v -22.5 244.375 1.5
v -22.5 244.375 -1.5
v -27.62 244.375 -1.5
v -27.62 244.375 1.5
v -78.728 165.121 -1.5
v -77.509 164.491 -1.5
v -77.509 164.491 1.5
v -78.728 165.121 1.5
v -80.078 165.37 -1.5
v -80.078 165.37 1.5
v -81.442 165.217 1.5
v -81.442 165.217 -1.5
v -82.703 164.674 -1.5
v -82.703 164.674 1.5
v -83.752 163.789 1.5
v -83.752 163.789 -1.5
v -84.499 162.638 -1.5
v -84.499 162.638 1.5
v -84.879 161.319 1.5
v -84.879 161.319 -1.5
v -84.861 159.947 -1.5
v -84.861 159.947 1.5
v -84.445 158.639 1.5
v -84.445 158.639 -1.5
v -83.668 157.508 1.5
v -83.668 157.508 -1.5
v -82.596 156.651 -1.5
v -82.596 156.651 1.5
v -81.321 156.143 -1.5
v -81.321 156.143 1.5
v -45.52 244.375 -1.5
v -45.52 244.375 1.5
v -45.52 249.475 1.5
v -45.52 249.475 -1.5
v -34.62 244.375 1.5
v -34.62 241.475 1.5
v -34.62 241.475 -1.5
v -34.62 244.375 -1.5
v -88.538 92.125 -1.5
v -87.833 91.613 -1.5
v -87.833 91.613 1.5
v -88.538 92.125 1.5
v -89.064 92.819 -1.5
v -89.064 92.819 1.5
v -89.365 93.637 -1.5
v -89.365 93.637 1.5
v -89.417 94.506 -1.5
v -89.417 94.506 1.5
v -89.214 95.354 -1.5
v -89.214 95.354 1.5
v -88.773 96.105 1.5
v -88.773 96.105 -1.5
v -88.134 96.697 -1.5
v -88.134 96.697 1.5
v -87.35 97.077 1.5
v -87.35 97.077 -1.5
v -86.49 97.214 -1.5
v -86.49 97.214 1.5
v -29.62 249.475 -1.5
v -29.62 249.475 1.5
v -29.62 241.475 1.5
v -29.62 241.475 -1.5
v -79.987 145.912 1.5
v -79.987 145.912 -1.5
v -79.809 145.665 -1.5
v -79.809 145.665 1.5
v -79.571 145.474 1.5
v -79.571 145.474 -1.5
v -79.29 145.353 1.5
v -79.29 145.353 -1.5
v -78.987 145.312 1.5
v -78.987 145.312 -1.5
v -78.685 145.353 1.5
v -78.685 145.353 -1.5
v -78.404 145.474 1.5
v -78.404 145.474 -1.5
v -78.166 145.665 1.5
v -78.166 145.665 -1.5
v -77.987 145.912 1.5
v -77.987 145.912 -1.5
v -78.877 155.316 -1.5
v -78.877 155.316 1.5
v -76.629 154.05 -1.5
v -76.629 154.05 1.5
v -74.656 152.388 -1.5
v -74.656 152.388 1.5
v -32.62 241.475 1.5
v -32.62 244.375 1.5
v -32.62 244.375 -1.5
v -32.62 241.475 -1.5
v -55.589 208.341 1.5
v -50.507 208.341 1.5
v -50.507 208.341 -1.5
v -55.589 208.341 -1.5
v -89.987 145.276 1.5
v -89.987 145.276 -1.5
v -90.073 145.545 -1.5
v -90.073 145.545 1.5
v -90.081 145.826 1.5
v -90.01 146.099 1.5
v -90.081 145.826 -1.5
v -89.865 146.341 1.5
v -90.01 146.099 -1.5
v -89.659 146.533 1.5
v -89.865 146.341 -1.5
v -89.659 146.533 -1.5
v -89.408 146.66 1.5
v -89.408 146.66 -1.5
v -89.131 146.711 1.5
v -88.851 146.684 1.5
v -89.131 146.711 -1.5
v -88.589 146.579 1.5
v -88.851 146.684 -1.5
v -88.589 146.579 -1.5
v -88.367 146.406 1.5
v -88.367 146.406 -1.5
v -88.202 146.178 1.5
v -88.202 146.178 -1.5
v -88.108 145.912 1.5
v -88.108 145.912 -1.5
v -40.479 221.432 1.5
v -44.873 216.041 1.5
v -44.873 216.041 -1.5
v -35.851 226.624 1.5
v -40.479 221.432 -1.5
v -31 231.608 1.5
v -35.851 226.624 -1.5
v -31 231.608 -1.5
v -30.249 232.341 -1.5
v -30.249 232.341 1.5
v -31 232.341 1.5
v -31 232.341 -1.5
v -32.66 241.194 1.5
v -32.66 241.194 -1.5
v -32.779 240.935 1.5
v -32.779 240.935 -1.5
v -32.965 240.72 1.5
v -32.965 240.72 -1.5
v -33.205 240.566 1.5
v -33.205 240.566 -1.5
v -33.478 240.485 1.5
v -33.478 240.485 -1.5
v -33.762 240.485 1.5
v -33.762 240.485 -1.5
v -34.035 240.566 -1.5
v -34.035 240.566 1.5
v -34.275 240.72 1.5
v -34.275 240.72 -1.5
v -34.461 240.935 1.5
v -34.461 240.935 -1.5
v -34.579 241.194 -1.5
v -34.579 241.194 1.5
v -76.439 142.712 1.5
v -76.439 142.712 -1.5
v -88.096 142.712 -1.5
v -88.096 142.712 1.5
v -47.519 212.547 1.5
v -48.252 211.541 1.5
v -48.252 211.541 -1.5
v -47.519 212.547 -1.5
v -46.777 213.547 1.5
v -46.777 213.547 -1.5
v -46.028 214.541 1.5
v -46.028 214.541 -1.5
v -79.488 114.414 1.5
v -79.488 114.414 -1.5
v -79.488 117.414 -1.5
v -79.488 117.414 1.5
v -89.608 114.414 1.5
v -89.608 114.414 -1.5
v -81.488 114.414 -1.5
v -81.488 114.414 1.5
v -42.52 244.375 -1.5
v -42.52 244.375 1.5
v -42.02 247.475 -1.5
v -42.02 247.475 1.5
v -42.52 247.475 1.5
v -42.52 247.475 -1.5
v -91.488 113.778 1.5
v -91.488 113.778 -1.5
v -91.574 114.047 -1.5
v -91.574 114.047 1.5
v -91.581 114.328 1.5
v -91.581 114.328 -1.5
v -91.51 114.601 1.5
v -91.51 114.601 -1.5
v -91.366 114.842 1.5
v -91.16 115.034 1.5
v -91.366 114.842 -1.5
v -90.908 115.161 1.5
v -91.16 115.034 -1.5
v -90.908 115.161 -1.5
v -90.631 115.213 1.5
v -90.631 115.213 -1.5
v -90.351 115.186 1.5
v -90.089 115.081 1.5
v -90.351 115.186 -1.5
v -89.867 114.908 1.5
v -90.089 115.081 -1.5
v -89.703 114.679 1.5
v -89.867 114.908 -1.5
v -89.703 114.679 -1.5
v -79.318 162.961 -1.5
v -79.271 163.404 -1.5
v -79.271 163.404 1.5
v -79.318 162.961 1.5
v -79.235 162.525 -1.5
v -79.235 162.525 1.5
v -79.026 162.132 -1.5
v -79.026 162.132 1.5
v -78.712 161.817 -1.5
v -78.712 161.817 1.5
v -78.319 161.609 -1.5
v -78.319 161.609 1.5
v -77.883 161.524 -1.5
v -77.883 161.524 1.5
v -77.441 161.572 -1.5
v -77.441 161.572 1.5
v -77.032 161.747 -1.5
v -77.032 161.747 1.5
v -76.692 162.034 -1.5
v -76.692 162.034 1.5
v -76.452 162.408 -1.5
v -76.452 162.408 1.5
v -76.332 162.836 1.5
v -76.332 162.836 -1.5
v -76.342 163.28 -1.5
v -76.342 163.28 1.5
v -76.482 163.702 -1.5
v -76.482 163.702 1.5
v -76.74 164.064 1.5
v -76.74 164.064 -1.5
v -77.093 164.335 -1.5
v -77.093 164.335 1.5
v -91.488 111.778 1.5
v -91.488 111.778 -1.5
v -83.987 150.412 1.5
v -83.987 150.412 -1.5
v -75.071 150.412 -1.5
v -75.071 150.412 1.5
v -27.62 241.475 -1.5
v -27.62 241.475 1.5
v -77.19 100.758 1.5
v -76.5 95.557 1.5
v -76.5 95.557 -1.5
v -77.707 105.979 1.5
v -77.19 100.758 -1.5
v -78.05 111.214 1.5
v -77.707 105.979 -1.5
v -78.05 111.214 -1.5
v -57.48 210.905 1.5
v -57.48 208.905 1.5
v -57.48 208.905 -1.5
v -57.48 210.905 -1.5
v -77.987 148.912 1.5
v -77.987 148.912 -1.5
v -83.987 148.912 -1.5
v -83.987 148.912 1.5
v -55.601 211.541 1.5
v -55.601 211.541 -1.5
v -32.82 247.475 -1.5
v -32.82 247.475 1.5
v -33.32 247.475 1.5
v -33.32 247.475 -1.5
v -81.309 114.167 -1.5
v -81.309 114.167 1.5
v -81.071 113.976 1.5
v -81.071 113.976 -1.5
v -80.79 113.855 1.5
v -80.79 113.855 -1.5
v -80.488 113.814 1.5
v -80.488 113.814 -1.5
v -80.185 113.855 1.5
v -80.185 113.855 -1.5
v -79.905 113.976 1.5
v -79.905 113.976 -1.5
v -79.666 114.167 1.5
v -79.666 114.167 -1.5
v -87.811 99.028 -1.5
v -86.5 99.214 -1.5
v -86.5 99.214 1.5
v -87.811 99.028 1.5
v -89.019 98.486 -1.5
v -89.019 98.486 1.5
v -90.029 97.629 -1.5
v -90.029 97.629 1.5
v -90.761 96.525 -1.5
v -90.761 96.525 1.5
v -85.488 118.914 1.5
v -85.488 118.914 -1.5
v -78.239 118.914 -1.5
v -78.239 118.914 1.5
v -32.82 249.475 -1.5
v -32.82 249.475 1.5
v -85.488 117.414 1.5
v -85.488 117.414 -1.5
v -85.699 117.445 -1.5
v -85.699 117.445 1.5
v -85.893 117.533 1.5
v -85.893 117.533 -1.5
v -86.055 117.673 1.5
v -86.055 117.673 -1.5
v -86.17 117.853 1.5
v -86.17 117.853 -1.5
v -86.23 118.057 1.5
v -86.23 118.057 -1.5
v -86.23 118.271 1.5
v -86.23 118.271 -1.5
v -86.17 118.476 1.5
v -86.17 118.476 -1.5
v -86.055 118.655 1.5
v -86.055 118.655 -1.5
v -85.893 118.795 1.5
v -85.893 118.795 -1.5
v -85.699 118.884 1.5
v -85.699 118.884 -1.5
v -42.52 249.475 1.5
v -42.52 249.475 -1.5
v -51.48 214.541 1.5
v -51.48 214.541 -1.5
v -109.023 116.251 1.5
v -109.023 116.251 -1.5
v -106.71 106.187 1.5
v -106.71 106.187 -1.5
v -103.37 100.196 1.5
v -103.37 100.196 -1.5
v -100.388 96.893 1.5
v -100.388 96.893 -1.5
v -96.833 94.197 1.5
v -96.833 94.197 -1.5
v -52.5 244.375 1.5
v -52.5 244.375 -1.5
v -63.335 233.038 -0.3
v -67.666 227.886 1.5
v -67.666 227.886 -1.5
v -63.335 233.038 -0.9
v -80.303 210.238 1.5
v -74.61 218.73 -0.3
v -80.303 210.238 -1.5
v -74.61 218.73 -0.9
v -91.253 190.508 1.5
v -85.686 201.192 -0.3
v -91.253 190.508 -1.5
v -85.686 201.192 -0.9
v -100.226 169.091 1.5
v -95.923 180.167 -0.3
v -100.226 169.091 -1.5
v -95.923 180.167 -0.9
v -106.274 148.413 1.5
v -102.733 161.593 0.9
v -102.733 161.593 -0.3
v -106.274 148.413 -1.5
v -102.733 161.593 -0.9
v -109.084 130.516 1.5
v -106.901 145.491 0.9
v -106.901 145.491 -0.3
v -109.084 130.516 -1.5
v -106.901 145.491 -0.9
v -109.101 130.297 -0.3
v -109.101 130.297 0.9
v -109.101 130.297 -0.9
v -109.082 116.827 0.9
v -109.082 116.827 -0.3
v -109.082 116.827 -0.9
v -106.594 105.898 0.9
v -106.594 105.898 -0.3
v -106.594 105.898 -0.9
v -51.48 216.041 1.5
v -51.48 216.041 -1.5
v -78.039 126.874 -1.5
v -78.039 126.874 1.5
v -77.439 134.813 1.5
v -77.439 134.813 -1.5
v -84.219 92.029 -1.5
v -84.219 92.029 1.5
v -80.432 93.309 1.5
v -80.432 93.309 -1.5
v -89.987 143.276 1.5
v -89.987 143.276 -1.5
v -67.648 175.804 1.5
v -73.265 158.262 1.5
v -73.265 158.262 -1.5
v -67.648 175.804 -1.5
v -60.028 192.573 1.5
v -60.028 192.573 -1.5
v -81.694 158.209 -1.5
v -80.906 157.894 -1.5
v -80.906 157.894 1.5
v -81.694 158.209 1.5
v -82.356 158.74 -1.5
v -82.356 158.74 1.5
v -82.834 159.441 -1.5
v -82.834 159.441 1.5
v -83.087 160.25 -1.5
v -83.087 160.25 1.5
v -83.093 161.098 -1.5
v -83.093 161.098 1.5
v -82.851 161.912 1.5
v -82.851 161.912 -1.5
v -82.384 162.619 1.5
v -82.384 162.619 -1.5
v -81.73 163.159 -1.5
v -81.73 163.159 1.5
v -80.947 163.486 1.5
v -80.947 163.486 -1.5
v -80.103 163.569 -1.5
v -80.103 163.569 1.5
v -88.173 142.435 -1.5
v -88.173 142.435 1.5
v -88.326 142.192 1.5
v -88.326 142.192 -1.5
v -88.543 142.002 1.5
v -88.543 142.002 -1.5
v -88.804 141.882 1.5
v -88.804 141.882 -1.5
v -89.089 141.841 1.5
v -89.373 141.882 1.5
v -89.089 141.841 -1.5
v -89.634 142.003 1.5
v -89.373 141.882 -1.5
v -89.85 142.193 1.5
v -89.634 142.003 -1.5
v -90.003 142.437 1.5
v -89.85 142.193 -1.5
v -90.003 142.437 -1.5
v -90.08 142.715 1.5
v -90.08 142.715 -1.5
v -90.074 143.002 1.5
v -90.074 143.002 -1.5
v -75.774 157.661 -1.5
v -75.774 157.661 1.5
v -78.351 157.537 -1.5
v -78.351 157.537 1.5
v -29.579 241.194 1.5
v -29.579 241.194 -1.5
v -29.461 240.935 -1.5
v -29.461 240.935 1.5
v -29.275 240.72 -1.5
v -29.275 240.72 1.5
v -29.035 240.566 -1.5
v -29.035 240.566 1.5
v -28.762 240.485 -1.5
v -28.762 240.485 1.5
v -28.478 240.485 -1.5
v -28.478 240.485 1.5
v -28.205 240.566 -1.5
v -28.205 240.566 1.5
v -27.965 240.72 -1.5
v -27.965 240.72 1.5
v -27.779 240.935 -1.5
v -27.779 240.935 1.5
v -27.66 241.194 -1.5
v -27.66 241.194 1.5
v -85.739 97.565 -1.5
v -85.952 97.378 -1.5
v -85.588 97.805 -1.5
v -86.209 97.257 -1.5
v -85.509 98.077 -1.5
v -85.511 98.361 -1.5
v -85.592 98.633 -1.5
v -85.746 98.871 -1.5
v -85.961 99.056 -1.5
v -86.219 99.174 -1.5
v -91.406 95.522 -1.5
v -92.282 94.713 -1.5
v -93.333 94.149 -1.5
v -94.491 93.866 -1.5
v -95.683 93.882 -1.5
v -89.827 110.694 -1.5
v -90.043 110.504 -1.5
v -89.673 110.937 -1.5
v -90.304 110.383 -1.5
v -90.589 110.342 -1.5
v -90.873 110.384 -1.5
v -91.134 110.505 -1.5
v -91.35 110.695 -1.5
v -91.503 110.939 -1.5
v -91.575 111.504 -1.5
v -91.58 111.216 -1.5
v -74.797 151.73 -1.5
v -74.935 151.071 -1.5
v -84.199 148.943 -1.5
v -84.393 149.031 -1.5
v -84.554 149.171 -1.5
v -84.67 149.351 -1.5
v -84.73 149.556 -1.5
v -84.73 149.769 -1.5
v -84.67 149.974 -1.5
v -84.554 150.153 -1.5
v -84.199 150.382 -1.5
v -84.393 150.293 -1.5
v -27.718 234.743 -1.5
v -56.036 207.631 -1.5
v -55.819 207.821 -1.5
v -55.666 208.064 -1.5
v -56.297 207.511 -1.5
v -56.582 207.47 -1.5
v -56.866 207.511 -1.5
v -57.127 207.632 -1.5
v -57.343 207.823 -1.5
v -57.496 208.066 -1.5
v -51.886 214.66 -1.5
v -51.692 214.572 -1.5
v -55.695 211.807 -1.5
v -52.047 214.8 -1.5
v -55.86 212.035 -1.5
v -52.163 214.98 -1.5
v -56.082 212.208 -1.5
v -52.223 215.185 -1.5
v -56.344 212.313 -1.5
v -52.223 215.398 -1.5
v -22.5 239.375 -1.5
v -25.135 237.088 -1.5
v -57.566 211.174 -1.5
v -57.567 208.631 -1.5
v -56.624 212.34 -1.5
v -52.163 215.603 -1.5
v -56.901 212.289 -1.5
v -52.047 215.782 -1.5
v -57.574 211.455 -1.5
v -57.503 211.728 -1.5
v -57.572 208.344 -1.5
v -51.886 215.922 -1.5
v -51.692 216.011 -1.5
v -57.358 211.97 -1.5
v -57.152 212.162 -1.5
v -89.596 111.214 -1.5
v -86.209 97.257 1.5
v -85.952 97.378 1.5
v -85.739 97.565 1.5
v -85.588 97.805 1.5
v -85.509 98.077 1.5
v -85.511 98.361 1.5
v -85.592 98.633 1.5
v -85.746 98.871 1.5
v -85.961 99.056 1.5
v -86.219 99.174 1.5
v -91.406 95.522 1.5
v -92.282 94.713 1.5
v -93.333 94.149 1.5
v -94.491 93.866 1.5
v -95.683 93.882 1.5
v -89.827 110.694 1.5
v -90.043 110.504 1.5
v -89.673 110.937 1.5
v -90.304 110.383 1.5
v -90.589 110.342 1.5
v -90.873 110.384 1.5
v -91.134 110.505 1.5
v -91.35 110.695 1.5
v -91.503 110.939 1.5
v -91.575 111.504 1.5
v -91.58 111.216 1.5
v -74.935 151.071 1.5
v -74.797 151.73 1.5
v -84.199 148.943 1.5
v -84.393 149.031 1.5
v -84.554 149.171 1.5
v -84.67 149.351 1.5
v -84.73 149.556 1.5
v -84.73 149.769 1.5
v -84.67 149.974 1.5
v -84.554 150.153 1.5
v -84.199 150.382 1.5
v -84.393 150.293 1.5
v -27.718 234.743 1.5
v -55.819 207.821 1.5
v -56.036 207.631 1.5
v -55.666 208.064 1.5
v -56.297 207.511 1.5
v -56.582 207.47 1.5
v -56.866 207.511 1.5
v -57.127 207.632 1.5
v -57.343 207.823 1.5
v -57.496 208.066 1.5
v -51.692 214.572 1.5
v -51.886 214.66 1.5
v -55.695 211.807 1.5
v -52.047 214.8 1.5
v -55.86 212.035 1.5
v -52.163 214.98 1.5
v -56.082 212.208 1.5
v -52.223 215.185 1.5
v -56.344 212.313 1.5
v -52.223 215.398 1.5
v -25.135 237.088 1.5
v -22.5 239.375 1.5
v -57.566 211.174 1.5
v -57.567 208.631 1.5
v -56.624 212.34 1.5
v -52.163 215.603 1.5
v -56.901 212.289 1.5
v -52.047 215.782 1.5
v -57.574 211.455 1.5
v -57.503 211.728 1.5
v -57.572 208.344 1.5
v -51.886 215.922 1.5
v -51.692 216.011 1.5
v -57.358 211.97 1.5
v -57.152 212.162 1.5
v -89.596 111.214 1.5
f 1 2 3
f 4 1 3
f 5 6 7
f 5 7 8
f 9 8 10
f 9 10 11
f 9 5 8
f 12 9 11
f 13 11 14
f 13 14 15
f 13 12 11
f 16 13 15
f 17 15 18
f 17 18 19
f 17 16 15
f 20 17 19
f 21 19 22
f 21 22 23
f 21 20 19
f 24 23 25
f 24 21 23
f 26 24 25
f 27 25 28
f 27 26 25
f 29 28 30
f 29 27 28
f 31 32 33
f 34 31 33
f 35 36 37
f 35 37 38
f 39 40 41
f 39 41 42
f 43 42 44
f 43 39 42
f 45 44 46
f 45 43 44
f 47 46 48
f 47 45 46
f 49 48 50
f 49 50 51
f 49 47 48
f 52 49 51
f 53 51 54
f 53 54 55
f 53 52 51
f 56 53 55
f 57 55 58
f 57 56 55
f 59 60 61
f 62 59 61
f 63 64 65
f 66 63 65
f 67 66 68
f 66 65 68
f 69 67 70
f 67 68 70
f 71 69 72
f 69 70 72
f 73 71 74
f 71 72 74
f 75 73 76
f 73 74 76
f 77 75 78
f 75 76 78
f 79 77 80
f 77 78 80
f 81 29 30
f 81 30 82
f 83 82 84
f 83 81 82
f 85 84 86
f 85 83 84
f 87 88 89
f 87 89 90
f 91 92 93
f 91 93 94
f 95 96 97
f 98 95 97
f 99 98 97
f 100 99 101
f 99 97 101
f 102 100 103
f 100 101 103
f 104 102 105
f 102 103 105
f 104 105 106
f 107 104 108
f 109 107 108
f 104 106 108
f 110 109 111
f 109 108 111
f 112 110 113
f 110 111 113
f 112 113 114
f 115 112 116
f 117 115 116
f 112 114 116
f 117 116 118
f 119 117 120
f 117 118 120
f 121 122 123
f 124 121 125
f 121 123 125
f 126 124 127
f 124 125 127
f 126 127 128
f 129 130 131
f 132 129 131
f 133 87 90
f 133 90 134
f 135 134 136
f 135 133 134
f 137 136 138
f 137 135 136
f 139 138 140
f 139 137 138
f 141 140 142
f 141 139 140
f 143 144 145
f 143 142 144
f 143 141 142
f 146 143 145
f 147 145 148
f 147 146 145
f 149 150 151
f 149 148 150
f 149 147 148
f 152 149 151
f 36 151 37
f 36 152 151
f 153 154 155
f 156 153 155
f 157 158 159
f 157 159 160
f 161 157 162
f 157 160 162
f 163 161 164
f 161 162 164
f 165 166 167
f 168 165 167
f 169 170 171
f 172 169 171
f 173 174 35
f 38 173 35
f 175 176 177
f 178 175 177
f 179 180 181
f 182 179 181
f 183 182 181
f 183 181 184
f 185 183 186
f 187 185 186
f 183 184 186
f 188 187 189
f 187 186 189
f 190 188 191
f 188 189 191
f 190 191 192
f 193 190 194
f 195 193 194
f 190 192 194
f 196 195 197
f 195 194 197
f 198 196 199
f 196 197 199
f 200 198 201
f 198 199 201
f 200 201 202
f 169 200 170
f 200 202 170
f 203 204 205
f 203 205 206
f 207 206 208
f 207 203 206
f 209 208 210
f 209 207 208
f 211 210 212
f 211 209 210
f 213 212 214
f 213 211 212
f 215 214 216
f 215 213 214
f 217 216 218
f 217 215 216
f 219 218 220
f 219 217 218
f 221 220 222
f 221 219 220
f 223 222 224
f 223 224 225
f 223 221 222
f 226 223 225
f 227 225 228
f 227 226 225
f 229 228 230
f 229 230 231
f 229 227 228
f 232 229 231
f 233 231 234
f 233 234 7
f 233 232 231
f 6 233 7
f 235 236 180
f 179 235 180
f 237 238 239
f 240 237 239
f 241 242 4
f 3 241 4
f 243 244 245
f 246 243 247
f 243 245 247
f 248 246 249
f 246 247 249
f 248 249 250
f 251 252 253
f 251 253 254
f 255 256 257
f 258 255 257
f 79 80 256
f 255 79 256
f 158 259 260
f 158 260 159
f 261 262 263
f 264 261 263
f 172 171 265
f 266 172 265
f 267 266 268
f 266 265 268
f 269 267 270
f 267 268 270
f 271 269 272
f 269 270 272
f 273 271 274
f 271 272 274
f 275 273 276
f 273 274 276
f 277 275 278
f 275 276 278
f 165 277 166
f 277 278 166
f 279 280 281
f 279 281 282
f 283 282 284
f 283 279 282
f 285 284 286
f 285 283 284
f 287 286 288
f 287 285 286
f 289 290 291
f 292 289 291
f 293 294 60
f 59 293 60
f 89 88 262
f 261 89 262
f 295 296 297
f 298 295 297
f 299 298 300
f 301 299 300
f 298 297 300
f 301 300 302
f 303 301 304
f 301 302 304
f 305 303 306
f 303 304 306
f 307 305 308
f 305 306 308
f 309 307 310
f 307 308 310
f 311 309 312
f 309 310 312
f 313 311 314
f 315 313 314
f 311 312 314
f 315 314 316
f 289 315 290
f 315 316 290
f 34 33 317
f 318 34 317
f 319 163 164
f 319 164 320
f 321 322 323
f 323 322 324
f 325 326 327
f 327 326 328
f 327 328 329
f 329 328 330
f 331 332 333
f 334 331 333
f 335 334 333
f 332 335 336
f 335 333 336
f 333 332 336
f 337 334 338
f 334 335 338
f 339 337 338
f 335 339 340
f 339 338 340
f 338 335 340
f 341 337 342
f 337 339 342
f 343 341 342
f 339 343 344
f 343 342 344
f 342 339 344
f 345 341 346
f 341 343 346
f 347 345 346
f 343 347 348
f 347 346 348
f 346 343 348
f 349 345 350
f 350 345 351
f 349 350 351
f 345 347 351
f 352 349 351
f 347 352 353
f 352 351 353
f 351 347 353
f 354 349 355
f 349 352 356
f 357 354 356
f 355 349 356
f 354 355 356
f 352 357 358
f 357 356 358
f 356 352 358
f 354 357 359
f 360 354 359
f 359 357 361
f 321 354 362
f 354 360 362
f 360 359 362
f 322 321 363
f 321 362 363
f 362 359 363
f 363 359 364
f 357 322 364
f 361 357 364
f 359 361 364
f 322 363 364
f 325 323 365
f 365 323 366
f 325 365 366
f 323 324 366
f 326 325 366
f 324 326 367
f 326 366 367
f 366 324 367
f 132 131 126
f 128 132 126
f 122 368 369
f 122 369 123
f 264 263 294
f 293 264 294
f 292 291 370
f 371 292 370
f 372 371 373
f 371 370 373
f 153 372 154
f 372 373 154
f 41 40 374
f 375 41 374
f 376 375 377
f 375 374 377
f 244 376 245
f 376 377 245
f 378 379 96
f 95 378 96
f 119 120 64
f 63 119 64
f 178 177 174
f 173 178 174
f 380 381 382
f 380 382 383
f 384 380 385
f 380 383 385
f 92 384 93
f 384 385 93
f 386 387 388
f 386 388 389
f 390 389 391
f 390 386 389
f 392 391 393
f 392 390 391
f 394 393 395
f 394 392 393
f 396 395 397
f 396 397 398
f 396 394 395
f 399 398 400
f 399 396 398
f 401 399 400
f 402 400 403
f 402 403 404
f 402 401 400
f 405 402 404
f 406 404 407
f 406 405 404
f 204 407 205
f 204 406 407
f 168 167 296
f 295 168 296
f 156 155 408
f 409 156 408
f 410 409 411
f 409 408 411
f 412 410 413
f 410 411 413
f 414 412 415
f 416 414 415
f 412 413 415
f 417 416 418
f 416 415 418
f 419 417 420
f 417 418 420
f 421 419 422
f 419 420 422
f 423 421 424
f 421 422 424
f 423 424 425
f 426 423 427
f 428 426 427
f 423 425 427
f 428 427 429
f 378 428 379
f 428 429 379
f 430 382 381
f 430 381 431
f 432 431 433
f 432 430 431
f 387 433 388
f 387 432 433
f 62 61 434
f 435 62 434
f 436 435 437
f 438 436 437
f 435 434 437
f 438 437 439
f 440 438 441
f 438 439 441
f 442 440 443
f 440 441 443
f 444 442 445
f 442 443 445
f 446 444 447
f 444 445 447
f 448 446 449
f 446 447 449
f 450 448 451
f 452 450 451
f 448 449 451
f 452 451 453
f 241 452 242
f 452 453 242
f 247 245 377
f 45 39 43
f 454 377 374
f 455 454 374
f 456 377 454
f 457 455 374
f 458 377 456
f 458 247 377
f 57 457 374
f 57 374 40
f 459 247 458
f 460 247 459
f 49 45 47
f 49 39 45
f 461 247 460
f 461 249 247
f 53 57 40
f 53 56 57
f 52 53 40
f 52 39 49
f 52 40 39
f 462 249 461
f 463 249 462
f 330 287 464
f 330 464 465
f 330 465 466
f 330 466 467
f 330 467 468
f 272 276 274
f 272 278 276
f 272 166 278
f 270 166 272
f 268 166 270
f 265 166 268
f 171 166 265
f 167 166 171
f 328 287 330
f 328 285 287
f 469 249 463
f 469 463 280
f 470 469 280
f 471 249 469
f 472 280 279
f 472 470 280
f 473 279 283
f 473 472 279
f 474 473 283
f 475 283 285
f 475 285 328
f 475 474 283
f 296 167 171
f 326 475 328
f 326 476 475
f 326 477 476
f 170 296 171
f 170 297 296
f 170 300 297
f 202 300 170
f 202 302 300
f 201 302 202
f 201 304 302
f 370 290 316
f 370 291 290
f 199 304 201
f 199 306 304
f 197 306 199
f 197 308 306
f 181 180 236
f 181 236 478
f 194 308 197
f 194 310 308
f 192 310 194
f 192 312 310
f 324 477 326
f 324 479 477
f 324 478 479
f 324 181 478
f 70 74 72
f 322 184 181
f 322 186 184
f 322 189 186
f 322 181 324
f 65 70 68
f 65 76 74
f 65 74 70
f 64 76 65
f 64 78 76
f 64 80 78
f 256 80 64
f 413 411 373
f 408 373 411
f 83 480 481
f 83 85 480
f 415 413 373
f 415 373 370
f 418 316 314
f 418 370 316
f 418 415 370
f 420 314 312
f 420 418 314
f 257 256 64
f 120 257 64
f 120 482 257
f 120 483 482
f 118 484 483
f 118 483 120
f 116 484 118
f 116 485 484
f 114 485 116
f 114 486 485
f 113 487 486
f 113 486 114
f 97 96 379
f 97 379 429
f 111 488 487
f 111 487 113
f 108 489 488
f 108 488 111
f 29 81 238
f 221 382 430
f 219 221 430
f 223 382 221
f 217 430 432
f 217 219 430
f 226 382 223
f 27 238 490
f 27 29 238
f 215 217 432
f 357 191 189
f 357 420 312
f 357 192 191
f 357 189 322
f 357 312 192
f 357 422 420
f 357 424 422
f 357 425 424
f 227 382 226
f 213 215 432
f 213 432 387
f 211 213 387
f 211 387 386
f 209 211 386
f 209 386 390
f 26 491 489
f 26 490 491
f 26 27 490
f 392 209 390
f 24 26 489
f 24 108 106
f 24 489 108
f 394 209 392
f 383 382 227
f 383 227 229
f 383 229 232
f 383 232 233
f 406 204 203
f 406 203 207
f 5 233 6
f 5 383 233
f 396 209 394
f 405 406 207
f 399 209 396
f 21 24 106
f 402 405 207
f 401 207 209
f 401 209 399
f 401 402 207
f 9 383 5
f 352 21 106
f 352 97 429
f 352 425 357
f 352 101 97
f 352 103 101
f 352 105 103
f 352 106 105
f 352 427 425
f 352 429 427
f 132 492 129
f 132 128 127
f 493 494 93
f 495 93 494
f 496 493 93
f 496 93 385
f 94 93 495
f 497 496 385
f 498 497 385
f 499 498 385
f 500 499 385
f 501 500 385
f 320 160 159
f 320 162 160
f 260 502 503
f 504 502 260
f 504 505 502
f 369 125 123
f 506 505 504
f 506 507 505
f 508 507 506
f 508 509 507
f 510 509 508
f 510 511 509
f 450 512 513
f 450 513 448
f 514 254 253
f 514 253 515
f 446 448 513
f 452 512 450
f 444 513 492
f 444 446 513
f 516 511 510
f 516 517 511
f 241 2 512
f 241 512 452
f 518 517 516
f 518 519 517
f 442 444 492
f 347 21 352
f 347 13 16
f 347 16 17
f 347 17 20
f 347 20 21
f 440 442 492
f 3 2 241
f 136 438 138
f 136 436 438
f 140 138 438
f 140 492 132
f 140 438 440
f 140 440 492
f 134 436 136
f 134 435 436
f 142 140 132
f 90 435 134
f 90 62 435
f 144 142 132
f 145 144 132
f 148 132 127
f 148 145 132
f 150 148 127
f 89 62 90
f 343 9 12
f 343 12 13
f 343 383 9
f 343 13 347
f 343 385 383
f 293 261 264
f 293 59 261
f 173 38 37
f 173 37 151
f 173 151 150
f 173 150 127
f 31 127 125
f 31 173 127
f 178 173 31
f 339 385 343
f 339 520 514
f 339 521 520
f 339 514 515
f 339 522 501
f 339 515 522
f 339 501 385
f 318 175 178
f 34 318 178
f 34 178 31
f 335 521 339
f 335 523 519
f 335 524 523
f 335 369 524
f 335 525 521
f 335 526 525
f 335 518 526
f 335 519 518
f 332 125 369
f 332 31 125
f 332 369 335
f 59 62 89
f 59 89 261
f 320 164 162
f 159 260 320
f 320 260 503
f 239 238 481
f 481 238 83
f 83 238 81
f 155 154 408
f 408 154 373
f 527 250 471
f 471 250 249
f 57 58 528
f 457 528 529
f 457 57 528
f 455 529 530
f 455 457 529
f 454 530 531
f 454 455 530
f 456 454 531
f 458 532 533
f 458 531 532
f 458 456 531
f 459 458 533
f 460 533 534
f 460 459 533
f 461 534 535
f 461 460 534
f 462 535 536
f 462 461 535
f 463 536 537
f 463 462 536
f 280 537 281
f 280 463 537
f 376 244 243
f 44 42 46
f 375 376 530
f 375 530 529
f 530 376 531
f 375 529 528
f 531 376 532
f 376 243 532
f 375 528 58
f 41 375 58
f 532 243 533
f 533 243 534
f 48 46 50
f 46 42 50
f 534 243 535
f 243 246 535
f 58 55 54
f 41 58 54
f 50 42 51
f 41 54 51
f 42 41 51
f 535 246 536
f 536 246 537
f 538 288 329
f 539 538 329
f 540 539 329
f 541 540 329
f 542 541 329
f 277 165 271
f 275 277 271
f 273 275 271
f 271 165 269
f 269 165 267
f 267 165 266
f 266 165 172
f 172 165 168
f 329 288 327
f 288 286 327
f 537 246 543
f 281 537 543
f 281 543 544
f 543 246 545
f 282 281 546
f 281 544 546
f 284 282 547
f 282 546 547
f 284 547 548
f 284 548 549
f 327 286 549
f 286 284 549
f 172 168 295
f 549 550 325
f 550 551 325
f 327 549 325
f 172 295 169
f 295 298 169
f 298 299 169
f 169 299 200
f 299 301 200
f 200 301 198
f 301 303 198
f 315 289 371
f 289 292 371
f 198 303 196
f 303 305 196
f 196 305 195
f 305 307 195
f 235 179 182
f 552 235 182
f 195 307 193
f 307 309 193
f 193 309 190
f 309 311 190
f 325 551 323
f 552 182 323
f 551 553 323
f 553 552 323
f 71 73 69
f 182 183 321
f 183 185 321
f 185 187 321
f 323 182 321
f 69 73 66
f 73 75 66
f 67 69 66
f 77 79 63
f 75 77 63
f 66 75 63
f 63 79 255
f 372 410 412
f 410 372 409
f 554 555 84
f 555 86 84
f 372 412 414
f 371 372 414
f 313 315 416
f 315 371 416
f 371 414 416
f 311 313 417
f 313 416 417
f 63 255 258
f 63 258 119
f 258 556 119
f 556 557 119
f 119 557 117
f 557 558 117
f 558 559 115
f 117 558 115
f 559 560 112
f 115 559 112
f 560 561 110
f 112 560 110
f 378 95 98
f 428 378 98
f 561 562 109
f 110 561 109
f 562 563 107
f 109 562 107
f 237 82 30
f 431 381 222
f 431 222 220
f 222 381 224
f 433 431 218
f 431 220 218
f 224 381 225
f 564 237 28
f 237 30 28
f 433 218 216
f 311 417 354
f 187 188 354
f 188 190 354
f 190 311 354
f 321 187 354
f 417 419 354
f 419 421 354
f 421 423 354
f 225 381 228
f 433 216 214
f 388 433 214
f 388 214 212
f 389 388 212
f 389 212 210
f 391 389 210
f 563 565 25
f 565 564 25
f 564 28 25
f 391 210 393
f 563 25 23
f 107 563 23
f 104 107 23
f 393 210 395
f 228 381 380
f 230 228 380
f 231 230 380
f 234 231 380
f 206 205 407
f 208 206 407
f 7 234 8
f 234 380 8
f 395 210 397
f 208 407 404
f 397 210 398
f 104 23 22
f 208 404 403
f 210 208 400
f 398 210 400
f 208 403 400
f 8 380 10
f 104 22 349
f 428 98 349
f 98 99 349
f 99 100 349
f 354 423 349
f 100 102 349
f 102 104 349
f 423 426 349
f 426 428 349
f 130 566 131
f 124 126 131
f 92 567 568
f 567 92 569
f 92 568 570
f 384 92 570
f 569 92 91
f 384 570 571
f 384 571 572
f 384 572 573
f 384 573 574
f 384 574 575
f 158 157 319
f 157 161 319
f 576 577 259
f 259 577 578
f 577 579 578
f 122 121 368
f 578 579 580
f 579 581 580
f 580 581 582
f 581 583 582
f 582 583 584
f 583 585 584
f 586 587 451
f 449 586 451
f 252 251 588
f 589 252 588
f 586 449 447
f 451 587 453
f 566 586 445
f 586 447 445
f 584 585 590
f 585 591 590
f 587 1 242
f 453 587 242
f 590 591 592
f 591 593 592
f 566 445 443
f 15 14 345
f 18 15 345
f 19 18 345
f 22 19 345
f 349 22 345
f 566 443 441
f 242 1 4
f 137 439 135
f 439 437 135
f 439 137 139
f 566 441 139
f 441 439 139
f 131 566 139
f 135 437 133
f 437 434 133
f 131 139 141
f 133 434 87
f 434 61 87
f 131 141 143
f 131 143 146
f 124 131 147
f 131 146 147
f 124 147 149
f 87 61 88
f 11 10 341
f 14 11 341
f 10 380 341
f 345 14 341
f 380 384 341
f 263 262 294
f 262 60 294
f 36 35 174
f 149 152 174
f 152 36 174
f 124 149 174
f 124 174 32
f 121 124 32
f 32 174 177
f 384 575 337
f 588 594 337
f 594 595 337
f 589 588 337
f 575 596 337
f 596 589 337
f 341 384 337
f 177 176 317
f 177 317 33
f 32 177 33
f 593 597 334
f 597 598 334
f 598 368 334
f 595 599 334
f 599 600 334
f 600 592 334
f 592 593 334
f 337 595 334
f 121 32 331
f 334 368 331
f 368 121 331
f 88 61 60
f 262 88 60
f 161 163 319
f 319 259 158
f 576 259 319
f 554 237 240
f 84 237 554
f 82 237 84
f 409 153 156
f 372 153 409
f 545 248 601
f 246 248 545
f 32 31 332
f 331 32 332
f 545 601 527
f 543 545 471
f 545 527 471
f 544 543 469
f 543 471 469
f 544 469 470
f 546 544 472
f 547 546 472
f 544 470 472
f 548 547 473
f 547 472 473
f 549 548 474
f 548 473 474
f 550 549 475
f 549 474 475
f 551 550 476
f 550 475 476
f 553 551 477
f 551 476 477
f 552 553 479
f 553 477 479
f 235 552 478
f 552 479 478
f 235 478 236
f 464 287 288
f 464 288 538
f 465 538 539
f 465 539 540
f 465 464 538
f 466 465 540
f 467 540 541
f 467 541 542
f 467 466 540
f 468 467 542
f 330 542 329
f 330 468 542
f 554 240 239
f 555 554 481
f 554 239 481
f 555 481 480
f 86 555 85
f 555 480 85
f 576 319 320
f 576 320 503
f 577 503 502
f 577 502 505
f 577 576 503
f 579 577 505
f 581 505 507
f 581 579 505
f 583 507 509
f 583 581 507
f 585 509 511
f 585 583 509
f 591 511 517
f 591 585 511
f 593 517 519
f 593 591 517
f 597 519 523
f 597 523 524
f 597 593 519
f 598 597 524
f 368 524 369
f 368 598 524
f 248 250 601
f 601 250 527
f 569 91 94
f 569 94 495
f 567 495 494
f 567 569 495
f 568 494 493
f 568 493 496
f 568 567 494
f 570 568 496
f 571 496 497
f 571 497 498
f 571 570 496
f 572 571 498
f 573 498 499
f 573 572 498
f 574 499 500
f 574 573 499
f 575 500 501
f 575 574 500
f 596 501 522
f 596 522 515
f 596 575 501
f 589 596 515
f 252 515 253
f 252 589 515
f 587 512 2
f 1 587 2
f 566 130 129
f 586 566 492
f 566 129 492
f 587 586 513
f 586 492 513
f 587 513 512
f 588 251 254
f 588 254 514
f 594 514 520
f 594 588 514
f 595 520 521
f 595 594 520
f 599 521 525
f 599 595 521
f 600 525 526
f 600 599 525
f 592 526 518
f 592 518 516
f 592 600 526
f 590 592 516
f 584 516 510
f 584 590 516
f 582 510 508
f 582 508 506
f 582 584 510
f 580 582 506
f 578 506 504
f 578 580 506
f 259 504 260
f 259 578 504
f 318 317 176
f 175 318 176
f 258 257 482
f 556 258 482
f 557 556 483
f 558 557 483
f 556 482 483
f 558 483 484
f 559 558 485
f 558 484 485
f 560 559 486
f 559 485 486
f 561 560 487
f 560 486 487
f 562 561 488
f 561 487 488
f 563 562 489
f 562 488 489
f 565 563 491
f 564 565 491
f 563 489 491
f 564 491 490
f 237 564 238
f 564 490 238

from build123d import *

# Parameters (mm, degrees)
BOSS_EXTRUDE1_DEPTH          = 1.5
BOSS_EXTRUDE1_DEPTH_BACK     = 1.5
PLATE1_SLOT_DEPTH            = 268.75601623
PLATE2_SLOT_DEPTH            = 268.75601623
PLATE3_SLOT_START            = -3
PLATE3_SLOT_DEPTH            = 3
UPPER_START                  = -1.5
UPPER_BAND_HOOK_DEPTH        = 3
LOWER_BAND_HOOK_DEPTH        = 268.75601623
TOP_PLATE_TEETH_DEPTH        = 3
TOP_PLATE_TEETH_RELIEF_REACH = 274.419
SERVO_CLEARANCE_DEPTH        = 273.418652776


# Read off the part's stored shape, not the designer's step: upper band hook
with BuildPart() as part:
    # Sketch1 → Boss-Extrude1 (new, two sides: drawn at the far end of the back side and taken through both)
    with BuildSketch(Plane.XY.offset(-BOSS_EXTRUDE1_DEPTH_BACK)):
        with BuildLine():
            Line((-22.5, 244.375309013), (-52.5, 244.375309013))
            add(Edge.make_bspline(
                [(-52.5, 244.375309013), (-66.367869978, 231.126229196), (-86.384732952, 206.641303547), (-108.858903818, 146.113641656), (-112.113384109, 114.033108561), (-99.555792699, 93.554916207), (-87.306535283, 88.078010017), (-76.5, 95.556683179)],
                knots=[0, 0, 0, 0, 0.402834442, 0.481428609, 0.752106882, 0.807347499, 1, 1, 1, 1], degree=3))
            ThreePointArc((-76.5, 95.556683179), (-68.155677229, 174.470697778), (-22.5, 239.375309013))
            Line((-22.5, 239.375309013), (-22.5, 244.375309013))
        make_face()
    extrude(amount=BOSS_EXTRUDE1_DEPTH + BOSS_EXTRUDE1_DEPTH_BACK)

    # Sketch2 → plate1-slot (cut, through all)
    with BuildSketch(Plane(origin=(0, 0, -1.5), x_dir=(-1, 0, 0), z_dir=(0, 0, -1))):
        with BuildLine():
            Line((79.487704092, 114.414134112), (79.487704092, 117.414134112))
            Line((79.487704092, 117.414134112), (85.487704092, 117.414134112))
            ThreePointArc((85.487704092, 117.414134112), (86.237704092, 118.164134112), (85.487704092, 118.914134112))
            Line((85.487704092, 118.914134112), (64.487704092, 118.914134112))
            Line((64.487704092, 118.914134112), (64.487704092, 111.214134112))
            Line((64.487704092, 111.214134112), (79.487704092, 111.214134112))
            Line((79.487704092, 111.214134112), (89.59595837, 111.214134112))
            ThreePointArc((89.59595837, 111.214134112), (90.873465132, 110.384053417), (91.487704092, 111.778244218))
            Line((91.487704092, 111.778244218), (91.487704092, 113.778244218))
            ThreePointArc((91.487704092, 113.778244218), (90.908142597, 115.161403432), (89.607908195, 114.414134112))
            Line((89.607908195, 114.414134112), (81.487704092, 114.414134112))
            ThreePointArc((81.487704092, 114.414134112), (80.487704092, 113.814134112), (79.487704092, 114.414134112))
        make_face()
    extrude(amount=-PLATE1_SLOT_DEPTH, mode=Mode.SUBTRACT)

    # Sketch3 → plate2-slot (cut, through all)
    with BuildSketch(Plane(origin=(0, 0, -1.5), x_dir=(-1, 0, 0), z_dir=(0, 0, -1))):
        with BuildLine():
            Line((77.987499132, 145.912279649), (77.987499132, 148.912279649))
            Line((77.987499132, 148.912279649), (83.987499132, 148.912279649))
            ThreePointArc((83.987499132, 148.912279649), (84.737499132, 149.662279649), (83.987499132, 150.412279649))
            Line((83.987499132, 150.412279649), (62.987499132, 150.412279649))
            Line((62.987499132, 150.412279649), (62.987499132, 142.712279649))
            Line((62.987499132, 142.712279649), (77.987499132, 142.712279649))
            Line((77.987499132, 142.712279649), (88.09575341, 142.712279649))
            ThreePointArc((88.09575341, 142.712279649), (89.373260172, 141.882198954), (89.987499132, 143.276389755))
            Line((89.987499132, 143.276389755), (89.987499132, 145.276389755))
            ThreePointArc((89.987499132, 145.276389755), (89.407937637, 146.659548969), (88.107703235, 145.912279649))
            Line((88.107703235, 145.912279649), (79.987499132, 145.912279649))
            ThreePointArc((79.987499132, 145.912279649), (78.987499132, 145.312279649), (77.987499132, 145.912279649))
        make_face()
    extrude(amount=-PLATE2_SLOT_DEPTH, mode=Mode.SUBTRACT)

    # Sketch4 → plate3-slot (cut)
    with BuildSketch(Plane(origin=(0, 0, -1.5), x_dir=(-1, 0, 0), z_dir=(0, 0, -1)).offset(PLATE3_SLOT_START)):
        with BuildLine():
            Line((45.480431453, 211.541310922), (45.480431453, 214.541310922))
            Line((45.480431453, 214.541310922), (51.480431453, 214.541310922))
            ThreePointArc((51.480431453, 214.541310922), (52.230431453, 215.291310922), (51.480431453, 216.041310922))
            Line((51.480431453, 216.041310922), (30.480431453, 216.041310922))
            Line((30.480431453, 216.041310922), (30.480431453, 208.341310922))
            Line((30.480431453, 208.341310922), (45.480431453, 208.341310922))
            Line((45.480431453, 208.341310922), (55.588685731, 208.341310922))
            ThreePointArc((55.588685731, 208.341310922), (56.866192493, 207.511230226), (57.480431453, 208.905421027))
            Line((57.480431453, 208.905421027), (57.480431453, 210.905421027))
            ThreePointArc((57.480431453, 210.905421027), (56.900869958, 212.288580241), (55.600635556, 211.541310922))
            Line((55.600635556, 211.541310922), (47.480431453, 211.541310922))
            ThreePointArc((47.480431453, 211.541310922), (46.480431453, 210.941310922), (45.480431453, 211.541310922))
        make_face()
    extrude(amount=PLATE3_SLOT_DEPTH, mode=Mode.SUBTRACT)

    # upper band hook outline → upper band hook (cut)
    with BuildSketch(Plane.XY.offset(UPPER_START)):
        with BuildLine():
            ThreePointArc((-77.509182055, 164.490649705), (-84.498712373, 162.637889725), (-81.321034284, 156.14261332))
            ThreePointArc((-81.321034284, 156.14261332), (-77.723407217, 154.73588636), (-74.655916798, 152.38805677))
            ThreePointArc((-74.655916798, 152.38805677), (-73.988672918, 155.331583344), (-73.265324436, 158.261827372))
            ThreePointArc((-73.265324436, 158.261827372), (-77.059884741, 157.538561622), (-80.906354002, 157.894195537))
            ThreePointArc((-80.906354002, 157.894195537), (-83.002325348, 161.513908871), (-79.270729863, 163.403516141))
            ThreePointArc((-79.270729863, 163.403516141), (-77.031979162, 161.746671557), (-77.509182055, 164.490649705))
        make_face()
    extrude(amount=UPPER_BAND_HOOK_DEPTH, mode=Mode.SUBTRACT)

    # Sketch7 → lower band hook (cut, through all)
    with BuildSketch(Plane(origin=(0, 0, -1.5), x_dir=(-1, 0, 0), z_dir=(0, 0, -1))):
        with BuildLine():
            Line((-218.104253523, -68.140600113), (87.833291208, 91.612508945))
            ThreePointArc((87.833291208, 91.612508945), (89.346413744, 94.937455747), (86.489614642, 97.214188042))
            ThreePointArc((86.489614642, 97.214188042), (85.500013482, 98.219326861), (86.5, 99.214134112))
            ThreePointArc((86.5, 99.214134112), (89.019498135, 98.485649701), (90.761466541, 96.525010402))
            ThreePointArc((90.761466541, 96.525010402), (93.332622526, 94.148850656), (96.833291208, 94.196777889))
            Line((96.833291208, 94.196777889), (415.586561712, 226.541742558))
            Line((415.586561712, 226.541742558), (706.648712408, -399.364139305))
            Line((706.648712408, -399.364139305), (72.957897174, -694.046481976))
            Line((72.957897174, -694.046481976), (-218.104253523, -68.140600113))
        make_face()
    extrude(amount=-LOWER_BAND_HOOK_DEPTH, mode=Mode.SUBTRACT)

    # Sketch15 → top-plate-teeth (add)
    with BuildSketch(Plane.XY.offset(1.5)):
        with BuildLine():
            Line((-42.51998799, 247.475309013), (-42.51998799, 244.375309013))
            Line((-42.51998799, 244.375309013), (-34.61998799, 244.375309013))
            Line((-34.61998799, 244.375309013), (-34.61998799, 241.475309013))
            ThreePointArc((-34.61998799, 241.475309013), (-33.61998799, 240.475309013), (-32.61998799, 241.475309013))
            Line((-32.61998799, 241.475309013), (-32.61998799, 244.375309013))
            Line((-32.61998799, 244.375309013), (-32.81998799, 247.475309013))
            Line((-32.81998799, 247.475309013), (-33.31998799, 247.475309013))
            Line((-33.31998799, 247.475309013), (-32.81998799, 249.475309013))
            Line((-32.81998799, 249.475309013), (-29.61998799, 249.475309013))
            Line((-29.61998799, 249.475309013), (-29.61998799, 241.475309013))
            Line((-29.61998799, 241.475309013), (-29.61998799, 237.475309013))
            Line((-29.61998799, 237.475309013), (-45.51998799, 237.475309013))
            Line((-45.51998799, 237.475309013), (-45.51998799, 249.475309013))
            Line((-45.51998799, 249.475309013), (-42.51998799, 249.475309013))
            Line((-42.51998799, 249.475309013), (-42.01998799, 247.475309013))
            Line((-42.01998799, 247.475309013), (-42.51998799, 247.475309013))
        make_face()
    extrude(amount=-TOP_PLATE_TEETH_DEPTH)

    # Sketch17 → top-plate-teeth-relief (cut, up to next)
    with BuildSketch(Plane.XY.offset(1.5), mode=Mode.PRIVATE) as top_plate_teeth_relief_sk1:
        with BuildLine():
            Line((-34.61998799, 244.375309013), (-32.61998799, 244.375309013))
            Line((-32.61998799, 244.375309013), (-32.61998799, 241.475309013))
            ThreePointArc((-32.61998799, 241.475309013), (-33.61998799, 240.475309013), (-34.61998799, 241.475309013))
            Line((-34.61998799, 241.475309013), (-34.61998799, 244.375309013))
        make_face()
    top_plate_teeth_relief_tool1 = extrude(top_plate_teeth_relief_sk1.sketch, amount=-TOP_PLATE_TEETH_RELIEF_REACH, mode=Mode.PRIVATE) & part.part
    # Sketch17 → top-plate-teeth-relief (cut, up to next)
    with BuildSketch(Plane.XY.offset(1.5), mode=Mode.PRIVATE) as top_plate_teeth_relief_sk2:
        with BuildLine():
            Line((-29.61998799, 244.375309013), (-29.61998799, 241.475309013))
            ThreePointArc((-29.61998799, 241.475309013), (-28.61998799, 240.475309013), (-27.61998799, 241.475309013))
            Line((-27.61998799, 241.475309013), (-27.61998799, 244.375309013))
            Line((-27.61998799, 244.375309013), (-29.61998799, 244.375309013))
        make_face()
    top_plate_teeth_relief_tool2 = extrude(top_plate_teeth_relief_sk2.sketch, amount=-TOP_PLATE_TEETH_RELIEF_REACH, mode=Mode.PRIVATE) & part.part
    add(top_plate_teeth_relief_tool1.solids().sort_by_distance((-33.619988, 242.525851, 1.5))[0], mode=Mode.SUBTRACT)
    add(top_plate_teeth_relief_tool2.solids().sort_by_distance((-28.619988, 242.525851, 1.5))[0], mode=Mode.SUBTRACT)

    # Sketch10 → servo clearance (cut, through all)
    with BuildSketch(Plane.XY.offset(1.5)):
        Polygon((-31, -101.29759897), (-31, 231.608085493), (-31, 232.341310922), (-30.249126131, 232.341310922), (302.656558332, 232.341310922), (773.443840549, -238.47087445), (439.787282217, -572.109784342), align=None)
    extrude(amount=-SERVO_CLEARANCE_DEPTH, mode=Mode.SUBTRACT)


solid = part.part
